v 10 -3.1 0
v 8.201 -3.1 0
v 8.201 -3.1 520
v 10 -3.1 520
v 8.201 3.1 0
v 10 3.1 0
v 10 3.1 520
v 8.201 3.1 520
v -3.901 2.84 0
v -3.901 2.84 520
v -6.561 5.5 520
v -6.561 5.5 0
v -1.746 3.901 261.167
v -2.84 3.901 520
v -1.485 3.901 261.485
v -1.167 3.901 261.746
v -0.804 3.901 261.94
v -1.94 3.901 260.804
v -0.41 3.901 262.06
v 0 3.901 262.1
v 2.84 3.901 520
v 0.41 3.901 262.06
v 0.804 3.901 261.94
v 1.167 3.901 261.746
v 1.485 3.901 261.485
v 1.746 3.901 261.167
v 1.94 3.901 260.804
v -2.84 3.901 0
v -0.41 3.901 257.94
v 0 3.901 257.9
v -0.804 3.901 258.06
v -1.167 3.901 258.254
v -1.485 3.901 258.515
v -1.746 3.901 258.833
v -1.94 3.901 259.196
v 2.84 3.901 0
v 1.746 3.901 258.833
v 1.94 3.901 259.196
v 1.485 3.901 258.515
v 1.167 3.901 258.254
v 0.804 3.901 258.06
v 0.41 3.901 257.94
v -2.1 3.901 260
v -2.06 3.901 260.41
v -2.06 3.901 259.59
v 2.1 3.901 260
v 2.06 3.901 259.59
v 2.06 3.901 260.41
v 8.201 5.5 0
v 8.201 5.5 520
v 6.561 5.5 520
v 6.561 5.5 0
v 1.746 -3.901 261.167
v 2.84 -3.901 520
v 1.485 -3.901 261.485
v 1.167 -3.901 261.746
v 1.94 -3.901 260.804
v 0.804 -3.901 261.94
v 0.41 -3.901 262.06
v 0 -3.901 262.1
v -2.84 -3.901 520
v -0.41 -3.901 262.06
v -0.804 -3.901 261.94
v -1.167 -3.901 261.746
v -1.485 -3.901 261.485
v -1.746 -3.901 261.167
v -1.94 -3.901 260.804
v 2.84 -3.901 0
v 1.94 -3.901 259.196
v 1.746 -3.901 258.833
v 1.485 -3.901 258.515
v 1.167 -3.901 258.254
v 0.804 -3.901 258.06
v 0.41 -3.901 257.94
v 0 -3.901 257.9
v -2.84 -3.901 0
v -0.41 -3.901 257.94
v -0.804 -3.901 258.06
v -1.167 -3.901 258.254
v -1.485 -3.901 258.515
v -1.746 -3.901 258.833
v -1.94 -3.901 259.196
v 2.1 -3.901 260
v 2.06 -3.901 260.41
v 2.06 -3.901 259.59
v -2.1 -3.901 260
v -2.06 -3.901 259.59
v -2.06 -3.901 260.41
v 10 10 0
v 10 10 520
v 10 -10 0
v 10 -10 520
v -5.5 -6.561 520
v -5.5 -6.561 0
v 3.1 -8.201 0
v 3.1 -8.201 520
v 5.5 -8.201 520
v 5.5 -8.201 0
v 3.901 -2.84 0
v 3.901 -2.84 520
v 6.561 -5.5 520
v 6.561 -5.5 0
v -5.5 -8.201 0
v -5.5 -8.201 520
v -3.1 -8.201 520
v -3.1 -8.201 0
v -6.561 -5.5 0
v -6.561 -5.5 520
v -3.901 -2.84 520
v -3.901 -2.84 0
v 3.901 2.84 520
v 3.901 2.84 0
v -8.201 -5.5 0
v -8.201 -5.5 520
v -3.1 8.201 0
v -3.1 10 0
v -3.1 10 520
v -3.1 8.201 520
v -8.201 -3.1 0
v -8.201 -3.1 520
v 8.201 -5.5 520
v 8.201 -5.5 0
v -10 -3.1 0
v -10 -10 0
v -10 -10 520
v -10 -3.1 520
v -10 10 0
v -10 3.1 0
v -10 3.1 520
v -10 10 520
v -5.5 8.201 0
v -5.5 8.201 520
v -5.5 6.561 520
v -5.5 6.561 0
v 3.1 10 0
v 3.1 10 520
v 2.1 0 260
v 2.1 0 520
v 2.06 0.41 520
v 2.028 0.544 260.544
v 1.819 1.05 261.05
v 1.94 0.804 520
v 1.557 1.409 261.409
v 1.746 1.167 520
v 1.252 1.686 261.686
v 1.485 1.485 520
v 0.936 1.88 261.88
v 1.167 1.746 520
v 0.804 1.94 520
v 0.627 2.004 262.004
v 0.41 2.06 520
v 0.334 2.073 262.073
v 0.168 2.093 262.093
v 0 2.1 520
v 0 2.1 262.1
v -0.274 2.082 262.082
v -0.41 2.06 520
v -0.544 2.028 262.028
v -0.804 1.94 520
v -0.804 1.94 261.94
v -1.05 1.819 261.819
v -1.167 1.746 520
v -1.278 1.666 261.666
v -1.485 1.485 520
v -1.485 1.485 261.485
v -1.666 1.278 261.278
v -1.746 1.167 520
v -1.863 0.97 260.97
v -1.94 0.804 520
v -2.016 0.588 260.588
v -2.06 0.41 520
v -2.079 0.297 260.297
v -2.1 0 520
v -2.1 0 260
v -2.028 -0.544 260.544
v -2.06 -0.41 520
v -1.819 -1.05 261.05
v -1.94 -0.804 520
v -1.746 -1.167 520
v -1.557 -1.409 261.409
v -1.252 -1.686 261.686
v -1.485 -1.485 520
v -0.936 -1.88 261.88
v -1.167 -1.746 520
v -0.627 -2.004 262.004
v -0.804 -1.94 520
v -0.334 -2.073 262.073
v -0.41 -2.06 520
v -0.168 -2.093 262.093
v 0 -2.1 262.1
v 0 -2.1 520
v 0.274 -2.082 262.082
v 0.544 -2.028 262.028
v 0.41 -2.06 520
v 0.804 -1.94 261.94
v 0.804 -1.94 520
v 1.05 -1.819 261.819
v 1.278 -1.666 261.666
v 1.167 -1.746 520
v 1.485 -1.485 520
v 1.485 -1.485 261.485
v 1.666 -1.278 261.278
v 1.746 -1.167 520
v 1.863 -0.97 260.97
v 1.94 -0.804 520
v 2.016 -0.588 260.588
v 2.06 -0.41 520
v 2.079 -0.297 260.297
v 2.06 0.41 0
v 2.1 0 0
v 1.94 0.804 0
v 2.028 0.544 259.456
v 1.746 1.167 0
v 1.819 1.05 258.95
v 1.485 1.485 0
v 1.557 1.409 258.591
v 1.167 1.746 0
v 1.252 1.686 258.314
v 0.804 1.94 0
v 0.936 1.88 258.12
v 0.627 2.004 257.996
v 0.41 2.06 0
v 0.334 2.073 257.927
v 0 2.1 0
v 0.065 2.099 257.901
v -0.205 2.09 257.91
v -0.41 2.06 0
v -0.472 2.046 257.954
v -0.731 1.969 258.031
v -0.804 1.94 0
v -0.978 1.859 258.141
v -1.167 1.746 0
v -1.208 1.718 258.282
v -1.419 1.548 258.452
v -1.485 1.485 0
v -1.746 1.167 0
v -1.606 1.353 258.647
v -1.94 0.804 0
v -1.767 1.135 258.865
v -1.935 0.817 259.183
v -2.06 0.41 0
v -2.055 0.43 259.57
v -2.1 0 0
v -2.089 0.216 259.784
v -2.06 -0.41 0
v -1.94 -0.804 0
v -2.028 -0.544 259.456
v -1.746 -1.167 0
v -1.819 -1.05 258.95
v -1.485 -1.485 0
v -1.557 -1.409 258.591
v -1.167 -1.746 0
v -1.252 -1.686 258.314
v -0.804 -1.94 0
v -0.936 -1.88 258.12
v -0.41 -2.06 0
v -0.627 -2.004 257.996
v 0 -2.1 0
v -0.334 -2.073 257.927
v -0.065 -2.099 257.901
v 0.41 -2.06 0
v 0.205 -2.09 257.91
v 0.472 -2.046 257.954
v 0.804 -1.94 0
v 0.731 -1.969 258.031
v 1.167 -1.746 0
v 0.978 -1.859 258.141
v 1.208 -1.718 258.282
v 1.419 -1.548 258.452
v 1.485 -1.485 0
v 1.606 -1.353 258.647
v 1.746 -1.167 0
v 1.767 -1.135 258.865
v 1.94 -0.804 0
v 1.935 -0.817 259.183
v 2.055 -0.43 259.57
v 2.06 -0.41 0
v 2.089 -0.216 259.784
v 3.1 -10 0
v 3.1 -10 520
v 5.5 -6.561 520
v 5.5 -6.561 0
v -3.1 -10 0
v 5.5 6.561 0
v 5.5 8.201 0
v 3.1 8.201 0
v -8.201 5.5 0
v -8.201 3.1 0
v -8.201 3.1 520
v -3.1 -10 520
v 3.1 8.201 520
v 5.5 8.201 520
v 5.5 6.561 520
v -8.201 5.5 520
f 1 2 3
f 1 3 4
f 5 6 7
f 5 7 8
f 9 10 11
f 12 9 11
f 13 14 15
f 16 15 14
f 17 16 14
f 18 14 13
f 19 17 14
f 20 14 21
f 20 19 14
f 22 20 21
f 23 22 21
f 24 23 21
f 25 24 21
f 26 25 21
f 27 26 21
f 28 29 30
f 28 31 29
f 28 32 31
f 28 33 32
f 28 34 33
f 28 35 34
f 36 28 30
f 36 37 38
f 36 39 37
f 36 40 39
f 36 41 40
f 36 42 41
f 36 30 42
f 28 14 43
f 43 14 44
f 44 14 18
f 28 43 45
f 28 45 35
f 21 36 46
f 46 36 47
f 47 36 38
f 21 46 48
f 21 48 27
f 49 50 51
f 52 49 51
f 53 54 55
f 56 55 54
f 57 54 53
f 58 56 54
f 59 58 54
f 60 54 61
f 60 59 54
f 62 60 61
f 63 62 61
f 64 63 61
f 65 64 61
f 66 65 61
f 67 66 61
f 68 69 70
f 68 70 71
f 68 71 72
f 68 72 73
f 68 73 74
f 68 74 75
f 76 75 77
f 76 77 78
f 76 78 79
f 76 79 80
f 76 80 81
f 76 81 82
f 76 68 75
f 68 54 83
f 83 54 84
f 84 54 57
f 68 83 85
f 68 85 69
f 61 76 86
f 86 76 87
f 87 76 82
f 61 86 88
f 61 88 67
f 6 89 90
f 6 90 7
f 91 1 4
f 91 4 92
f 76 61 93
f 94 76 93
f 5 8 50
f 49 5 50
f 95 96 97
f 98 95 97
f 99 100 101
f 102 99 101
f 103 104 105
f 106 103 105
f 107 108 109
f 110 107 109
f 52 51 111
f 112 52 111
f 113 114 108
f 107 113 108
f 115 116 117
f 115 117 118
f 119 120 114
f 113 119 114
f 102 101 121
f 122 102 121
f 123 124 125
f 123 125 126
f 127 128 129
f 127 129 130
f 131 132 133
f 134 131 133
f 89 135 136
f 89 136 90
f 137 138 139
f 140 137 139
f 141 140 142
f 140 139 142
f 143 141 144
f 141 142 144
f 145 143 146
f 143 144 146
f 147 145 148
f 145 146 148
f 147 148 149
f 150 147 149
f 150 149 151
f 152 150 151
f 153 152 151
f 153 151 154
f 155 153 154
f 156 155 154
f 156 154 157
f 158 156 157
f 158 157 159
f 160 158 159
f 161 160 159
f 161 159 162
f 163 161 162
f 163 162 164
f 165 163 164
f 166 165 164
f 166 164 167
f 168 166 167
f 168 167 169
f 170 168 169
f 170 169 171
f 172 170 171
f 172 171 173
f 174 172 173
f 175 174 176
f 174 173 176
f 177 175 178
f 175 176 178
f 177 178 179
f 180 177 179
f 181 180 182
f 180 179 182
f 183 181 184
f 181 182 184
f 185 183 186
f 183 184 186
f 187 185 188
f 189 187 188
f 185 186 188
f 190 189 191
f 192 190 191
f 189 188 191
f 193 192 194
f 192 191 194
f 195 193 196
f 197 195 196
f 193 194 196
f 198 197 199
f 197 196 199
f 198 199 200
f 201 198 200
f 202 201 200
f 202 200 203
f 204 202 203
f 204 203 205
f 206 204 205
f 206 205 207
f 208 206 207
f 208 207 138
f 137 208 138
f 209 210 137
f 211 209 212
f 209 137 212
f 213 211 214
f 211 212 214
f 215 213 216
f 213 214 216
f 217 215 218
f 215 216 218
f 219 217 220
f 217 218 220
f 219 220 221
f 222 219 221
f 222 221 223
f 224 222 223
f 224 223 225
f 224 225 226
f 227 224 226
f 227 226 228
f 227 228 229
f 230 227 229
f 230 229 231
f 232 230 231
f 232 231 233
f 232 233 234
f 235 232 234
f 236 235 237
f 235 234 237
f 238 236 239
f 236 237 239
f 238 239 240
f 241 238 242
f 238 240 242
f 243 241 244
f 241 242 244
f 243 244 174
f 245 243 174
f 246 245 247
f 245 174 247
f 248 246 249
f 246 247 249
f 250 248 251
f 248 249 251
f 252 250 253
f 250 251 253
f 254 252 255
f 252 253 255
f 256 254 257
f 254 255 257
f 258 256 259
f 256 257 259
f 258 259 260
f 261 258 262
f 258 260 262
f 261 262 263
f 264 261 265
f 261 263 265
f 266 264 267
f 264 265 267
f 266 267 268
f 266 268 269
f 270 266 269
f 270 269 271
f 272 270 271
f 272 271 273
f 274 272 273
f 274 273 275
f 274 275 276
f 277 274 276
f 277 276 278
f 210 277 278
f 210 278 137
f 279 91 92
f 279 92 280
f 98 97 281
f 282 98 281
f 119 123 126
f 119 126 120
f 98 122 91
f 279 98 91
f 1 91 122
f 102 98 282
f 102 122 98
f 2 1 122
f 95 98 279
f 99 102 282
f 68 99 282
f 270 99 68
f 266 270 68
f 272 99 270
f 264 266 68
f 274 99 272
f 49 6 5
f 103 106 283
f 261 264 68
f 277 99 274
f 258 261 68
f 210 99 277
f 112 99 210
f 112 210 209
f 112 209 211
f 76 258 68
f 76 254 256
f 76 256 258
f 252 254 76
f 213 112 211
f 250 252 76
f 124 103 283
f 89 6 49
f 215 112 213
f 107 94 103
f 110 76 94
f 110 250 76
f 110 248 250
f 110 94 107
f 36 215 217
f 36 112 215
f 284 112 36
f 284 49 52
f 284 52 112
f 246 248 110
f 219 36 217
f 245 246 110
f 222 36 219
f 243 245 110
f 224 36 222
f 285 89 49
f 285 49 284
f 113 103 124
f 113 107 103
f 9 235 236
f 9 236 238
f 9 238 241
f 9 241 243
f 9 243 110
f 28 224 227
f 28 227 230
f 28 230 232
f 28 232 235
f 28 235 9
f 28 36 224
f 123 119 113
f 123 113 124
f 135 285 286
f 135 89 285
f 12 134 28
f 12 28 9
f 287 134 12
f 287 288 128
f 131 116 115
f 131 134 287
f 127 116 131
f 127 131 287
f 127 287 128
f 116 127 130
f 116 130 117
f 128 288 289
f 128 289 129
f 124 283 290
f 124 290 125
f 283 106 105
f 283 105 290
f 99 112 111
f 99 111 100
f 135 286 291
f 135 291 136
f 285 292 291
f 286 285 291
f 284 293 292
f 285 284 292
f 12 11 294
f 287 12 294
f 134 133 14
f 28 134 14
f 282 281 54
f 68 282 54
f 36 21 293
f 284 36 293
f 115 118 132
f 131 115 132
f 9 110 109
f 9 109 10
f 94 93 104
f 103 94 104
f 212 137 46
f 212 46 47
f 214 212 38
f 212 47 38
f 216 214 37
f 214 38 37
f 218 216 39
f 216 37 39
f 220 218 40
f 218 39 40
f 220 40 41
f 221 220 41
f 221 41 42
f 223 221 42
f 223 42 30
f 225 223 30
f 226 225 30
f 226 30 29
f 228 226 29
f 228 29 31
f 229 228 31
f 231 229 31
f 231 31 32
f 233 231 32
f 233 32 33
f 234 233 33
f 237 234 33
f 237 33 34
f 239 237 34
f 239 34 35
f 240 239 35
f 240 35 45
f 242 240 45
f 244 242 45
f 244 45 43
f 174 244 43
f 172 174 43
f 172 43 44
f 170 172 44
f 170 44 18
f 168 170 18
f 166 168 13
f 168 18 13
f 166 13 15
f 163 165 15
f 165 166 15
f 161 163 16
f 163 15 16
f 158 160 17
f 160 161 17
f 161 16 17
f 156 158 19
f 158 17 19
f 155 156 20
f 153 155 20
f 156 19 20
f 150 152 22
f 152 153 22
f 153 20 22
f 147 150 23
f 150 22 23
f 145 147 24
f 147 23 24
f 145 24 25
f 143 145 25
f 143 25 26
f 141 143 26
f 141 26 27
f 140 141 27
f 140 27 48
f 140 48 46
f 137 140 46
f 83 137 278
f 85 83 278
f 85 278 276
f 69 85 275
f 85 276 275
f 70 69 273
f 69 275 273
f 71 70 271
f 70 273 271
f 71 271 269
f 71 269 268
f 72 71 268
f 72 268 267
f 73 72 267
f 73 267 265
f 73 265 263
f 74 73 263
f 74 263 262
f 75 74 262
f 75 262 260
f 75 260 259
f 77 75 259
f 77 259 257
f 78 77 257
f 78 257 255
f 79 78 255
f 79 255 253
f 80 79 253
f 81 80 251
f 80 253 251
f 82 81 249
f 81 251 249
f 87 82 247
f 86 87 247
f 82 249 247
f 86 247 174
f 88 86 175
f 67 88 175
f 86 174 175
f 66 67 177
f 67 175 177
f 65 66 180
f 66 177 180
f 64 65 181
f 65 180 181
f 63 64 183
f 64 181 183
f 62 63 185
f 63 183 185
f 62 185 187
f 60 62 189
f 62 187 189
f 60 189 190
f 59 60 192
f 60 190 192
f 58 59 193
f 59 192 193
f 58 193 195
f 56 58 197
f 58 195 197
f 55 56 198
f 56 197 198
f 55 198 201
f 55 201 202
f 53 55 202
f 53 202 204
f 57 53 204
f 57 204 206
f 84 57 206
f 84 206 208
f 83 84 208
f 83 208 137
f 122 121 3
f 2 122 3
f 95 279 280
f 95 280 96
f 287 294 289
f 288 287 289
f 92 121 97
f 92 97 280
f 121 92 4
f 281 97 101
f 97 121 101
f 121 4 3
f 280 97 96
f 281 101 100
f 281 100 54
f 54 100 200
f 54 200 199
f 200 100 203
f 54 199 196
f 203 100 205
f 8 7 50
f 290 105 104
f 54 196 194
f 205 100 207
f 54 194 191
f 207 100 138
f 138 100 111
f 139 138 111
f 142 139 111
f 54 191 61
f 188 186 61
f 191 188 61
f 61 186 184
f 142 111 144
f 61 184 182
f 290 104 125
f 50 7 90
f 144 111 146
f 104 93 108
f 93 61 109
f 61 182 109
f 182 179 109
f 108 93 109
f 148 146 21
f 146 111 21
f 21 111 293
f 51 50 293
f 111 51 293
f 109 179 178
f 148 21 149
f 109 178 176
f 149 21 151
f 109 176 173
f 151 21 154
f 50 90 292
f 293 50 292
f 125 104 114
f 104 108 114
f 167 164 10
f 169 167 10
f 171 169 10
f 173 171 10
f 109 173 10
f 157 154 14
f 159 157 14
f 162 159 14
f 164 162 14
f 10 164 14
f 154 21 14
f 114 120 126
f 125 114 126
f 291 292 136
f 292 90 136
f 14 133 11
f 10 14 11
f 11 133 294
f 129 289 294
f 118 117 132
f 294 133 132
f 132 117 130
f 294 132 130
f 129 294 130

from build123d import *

# Parameters (mm, degrees)
BOSS_EXTRUDE1_DEPTH = 520
SKETCH2_R           = 2.1
CUT_EXTRUDE1_DEPTH  = 521
SKETCH3_R           = 2.1
CUT_EXTRUDE2_DEPTH  = 14.900660172


with BuildPart() as part:
    # Sketch1 → Boss-Extrude1 (new body)
    with BuildSketch(Plane.XY):
        Polygon((-3.1, 10), (-3.1, 8.200660172), (-5.5, 8.200660172), (-5.5, 6.560660172), (-2.84, 3.900660172), (2.84, 3.900660172), (5.5, 6.560660172), (5.5, 8.200660172), (3.1, 8.200660172), (3.1, 10), (10, 10), (10, 3.1), (8.200660172, 3.1), (8.200660172, 5.5), (6.560660172, 5.5), (3.900660172, 2.84), (3.900660172, -2.84), (6.560660172, -5.5), (8.200660172, -5.5), (8.200660172, -3.1), (10, -3.1), (10, -10), (3.1, -10), (3.1, -8.200660172), (5.5, -8.200660172), (5.5, -6.560660172), (2.84, -3.900660172), (-2.84, -3.900660172), (-5.5, -6.560660172), (-5.5, -8.200660172), (-3.1, -8.200660172), (-3.1, -10), (-10, -10), (-10, -3.1), (-8.200660172, -3.1), (-8.200660172, -5.5), (-6.560660172, -5.5), (-3.900660172, -2.84), (-3.900660172, 2.84), (-6.560660172, 5.5), (-8.200660172, 5.5), (-8.200660172, 3.1), (-10, 3.1), (-10, 10), align=None)
    extrude(amount=BOSS_EXTRUDE1_DEPTH)

    # Sketch2 → Cut-Extrude1 (cut, through all)
    with BuildSketch(Plane.XY.offset(520)):
        Circle(SKETCH2_R)
    extrude(amount=-CUT_EXTRUDE1_DEPTH, mode=Mode.SUBTRACT)

    # Sketch3 → Cut-Extrude2 (cut, through all)
    with BuildSketch(Plane(origin=(0, 3.900660172, 0), x_dir=(1, 0, 0), z_dir=(0, 1, 0))):
        with Locations((0, -260)):
            Circle(SKETCH3_R)
    extrude(amount=-CUT_EXTRUDE2_DEPTH, mode=Mode.SUBTRACT)


solid = part.part
